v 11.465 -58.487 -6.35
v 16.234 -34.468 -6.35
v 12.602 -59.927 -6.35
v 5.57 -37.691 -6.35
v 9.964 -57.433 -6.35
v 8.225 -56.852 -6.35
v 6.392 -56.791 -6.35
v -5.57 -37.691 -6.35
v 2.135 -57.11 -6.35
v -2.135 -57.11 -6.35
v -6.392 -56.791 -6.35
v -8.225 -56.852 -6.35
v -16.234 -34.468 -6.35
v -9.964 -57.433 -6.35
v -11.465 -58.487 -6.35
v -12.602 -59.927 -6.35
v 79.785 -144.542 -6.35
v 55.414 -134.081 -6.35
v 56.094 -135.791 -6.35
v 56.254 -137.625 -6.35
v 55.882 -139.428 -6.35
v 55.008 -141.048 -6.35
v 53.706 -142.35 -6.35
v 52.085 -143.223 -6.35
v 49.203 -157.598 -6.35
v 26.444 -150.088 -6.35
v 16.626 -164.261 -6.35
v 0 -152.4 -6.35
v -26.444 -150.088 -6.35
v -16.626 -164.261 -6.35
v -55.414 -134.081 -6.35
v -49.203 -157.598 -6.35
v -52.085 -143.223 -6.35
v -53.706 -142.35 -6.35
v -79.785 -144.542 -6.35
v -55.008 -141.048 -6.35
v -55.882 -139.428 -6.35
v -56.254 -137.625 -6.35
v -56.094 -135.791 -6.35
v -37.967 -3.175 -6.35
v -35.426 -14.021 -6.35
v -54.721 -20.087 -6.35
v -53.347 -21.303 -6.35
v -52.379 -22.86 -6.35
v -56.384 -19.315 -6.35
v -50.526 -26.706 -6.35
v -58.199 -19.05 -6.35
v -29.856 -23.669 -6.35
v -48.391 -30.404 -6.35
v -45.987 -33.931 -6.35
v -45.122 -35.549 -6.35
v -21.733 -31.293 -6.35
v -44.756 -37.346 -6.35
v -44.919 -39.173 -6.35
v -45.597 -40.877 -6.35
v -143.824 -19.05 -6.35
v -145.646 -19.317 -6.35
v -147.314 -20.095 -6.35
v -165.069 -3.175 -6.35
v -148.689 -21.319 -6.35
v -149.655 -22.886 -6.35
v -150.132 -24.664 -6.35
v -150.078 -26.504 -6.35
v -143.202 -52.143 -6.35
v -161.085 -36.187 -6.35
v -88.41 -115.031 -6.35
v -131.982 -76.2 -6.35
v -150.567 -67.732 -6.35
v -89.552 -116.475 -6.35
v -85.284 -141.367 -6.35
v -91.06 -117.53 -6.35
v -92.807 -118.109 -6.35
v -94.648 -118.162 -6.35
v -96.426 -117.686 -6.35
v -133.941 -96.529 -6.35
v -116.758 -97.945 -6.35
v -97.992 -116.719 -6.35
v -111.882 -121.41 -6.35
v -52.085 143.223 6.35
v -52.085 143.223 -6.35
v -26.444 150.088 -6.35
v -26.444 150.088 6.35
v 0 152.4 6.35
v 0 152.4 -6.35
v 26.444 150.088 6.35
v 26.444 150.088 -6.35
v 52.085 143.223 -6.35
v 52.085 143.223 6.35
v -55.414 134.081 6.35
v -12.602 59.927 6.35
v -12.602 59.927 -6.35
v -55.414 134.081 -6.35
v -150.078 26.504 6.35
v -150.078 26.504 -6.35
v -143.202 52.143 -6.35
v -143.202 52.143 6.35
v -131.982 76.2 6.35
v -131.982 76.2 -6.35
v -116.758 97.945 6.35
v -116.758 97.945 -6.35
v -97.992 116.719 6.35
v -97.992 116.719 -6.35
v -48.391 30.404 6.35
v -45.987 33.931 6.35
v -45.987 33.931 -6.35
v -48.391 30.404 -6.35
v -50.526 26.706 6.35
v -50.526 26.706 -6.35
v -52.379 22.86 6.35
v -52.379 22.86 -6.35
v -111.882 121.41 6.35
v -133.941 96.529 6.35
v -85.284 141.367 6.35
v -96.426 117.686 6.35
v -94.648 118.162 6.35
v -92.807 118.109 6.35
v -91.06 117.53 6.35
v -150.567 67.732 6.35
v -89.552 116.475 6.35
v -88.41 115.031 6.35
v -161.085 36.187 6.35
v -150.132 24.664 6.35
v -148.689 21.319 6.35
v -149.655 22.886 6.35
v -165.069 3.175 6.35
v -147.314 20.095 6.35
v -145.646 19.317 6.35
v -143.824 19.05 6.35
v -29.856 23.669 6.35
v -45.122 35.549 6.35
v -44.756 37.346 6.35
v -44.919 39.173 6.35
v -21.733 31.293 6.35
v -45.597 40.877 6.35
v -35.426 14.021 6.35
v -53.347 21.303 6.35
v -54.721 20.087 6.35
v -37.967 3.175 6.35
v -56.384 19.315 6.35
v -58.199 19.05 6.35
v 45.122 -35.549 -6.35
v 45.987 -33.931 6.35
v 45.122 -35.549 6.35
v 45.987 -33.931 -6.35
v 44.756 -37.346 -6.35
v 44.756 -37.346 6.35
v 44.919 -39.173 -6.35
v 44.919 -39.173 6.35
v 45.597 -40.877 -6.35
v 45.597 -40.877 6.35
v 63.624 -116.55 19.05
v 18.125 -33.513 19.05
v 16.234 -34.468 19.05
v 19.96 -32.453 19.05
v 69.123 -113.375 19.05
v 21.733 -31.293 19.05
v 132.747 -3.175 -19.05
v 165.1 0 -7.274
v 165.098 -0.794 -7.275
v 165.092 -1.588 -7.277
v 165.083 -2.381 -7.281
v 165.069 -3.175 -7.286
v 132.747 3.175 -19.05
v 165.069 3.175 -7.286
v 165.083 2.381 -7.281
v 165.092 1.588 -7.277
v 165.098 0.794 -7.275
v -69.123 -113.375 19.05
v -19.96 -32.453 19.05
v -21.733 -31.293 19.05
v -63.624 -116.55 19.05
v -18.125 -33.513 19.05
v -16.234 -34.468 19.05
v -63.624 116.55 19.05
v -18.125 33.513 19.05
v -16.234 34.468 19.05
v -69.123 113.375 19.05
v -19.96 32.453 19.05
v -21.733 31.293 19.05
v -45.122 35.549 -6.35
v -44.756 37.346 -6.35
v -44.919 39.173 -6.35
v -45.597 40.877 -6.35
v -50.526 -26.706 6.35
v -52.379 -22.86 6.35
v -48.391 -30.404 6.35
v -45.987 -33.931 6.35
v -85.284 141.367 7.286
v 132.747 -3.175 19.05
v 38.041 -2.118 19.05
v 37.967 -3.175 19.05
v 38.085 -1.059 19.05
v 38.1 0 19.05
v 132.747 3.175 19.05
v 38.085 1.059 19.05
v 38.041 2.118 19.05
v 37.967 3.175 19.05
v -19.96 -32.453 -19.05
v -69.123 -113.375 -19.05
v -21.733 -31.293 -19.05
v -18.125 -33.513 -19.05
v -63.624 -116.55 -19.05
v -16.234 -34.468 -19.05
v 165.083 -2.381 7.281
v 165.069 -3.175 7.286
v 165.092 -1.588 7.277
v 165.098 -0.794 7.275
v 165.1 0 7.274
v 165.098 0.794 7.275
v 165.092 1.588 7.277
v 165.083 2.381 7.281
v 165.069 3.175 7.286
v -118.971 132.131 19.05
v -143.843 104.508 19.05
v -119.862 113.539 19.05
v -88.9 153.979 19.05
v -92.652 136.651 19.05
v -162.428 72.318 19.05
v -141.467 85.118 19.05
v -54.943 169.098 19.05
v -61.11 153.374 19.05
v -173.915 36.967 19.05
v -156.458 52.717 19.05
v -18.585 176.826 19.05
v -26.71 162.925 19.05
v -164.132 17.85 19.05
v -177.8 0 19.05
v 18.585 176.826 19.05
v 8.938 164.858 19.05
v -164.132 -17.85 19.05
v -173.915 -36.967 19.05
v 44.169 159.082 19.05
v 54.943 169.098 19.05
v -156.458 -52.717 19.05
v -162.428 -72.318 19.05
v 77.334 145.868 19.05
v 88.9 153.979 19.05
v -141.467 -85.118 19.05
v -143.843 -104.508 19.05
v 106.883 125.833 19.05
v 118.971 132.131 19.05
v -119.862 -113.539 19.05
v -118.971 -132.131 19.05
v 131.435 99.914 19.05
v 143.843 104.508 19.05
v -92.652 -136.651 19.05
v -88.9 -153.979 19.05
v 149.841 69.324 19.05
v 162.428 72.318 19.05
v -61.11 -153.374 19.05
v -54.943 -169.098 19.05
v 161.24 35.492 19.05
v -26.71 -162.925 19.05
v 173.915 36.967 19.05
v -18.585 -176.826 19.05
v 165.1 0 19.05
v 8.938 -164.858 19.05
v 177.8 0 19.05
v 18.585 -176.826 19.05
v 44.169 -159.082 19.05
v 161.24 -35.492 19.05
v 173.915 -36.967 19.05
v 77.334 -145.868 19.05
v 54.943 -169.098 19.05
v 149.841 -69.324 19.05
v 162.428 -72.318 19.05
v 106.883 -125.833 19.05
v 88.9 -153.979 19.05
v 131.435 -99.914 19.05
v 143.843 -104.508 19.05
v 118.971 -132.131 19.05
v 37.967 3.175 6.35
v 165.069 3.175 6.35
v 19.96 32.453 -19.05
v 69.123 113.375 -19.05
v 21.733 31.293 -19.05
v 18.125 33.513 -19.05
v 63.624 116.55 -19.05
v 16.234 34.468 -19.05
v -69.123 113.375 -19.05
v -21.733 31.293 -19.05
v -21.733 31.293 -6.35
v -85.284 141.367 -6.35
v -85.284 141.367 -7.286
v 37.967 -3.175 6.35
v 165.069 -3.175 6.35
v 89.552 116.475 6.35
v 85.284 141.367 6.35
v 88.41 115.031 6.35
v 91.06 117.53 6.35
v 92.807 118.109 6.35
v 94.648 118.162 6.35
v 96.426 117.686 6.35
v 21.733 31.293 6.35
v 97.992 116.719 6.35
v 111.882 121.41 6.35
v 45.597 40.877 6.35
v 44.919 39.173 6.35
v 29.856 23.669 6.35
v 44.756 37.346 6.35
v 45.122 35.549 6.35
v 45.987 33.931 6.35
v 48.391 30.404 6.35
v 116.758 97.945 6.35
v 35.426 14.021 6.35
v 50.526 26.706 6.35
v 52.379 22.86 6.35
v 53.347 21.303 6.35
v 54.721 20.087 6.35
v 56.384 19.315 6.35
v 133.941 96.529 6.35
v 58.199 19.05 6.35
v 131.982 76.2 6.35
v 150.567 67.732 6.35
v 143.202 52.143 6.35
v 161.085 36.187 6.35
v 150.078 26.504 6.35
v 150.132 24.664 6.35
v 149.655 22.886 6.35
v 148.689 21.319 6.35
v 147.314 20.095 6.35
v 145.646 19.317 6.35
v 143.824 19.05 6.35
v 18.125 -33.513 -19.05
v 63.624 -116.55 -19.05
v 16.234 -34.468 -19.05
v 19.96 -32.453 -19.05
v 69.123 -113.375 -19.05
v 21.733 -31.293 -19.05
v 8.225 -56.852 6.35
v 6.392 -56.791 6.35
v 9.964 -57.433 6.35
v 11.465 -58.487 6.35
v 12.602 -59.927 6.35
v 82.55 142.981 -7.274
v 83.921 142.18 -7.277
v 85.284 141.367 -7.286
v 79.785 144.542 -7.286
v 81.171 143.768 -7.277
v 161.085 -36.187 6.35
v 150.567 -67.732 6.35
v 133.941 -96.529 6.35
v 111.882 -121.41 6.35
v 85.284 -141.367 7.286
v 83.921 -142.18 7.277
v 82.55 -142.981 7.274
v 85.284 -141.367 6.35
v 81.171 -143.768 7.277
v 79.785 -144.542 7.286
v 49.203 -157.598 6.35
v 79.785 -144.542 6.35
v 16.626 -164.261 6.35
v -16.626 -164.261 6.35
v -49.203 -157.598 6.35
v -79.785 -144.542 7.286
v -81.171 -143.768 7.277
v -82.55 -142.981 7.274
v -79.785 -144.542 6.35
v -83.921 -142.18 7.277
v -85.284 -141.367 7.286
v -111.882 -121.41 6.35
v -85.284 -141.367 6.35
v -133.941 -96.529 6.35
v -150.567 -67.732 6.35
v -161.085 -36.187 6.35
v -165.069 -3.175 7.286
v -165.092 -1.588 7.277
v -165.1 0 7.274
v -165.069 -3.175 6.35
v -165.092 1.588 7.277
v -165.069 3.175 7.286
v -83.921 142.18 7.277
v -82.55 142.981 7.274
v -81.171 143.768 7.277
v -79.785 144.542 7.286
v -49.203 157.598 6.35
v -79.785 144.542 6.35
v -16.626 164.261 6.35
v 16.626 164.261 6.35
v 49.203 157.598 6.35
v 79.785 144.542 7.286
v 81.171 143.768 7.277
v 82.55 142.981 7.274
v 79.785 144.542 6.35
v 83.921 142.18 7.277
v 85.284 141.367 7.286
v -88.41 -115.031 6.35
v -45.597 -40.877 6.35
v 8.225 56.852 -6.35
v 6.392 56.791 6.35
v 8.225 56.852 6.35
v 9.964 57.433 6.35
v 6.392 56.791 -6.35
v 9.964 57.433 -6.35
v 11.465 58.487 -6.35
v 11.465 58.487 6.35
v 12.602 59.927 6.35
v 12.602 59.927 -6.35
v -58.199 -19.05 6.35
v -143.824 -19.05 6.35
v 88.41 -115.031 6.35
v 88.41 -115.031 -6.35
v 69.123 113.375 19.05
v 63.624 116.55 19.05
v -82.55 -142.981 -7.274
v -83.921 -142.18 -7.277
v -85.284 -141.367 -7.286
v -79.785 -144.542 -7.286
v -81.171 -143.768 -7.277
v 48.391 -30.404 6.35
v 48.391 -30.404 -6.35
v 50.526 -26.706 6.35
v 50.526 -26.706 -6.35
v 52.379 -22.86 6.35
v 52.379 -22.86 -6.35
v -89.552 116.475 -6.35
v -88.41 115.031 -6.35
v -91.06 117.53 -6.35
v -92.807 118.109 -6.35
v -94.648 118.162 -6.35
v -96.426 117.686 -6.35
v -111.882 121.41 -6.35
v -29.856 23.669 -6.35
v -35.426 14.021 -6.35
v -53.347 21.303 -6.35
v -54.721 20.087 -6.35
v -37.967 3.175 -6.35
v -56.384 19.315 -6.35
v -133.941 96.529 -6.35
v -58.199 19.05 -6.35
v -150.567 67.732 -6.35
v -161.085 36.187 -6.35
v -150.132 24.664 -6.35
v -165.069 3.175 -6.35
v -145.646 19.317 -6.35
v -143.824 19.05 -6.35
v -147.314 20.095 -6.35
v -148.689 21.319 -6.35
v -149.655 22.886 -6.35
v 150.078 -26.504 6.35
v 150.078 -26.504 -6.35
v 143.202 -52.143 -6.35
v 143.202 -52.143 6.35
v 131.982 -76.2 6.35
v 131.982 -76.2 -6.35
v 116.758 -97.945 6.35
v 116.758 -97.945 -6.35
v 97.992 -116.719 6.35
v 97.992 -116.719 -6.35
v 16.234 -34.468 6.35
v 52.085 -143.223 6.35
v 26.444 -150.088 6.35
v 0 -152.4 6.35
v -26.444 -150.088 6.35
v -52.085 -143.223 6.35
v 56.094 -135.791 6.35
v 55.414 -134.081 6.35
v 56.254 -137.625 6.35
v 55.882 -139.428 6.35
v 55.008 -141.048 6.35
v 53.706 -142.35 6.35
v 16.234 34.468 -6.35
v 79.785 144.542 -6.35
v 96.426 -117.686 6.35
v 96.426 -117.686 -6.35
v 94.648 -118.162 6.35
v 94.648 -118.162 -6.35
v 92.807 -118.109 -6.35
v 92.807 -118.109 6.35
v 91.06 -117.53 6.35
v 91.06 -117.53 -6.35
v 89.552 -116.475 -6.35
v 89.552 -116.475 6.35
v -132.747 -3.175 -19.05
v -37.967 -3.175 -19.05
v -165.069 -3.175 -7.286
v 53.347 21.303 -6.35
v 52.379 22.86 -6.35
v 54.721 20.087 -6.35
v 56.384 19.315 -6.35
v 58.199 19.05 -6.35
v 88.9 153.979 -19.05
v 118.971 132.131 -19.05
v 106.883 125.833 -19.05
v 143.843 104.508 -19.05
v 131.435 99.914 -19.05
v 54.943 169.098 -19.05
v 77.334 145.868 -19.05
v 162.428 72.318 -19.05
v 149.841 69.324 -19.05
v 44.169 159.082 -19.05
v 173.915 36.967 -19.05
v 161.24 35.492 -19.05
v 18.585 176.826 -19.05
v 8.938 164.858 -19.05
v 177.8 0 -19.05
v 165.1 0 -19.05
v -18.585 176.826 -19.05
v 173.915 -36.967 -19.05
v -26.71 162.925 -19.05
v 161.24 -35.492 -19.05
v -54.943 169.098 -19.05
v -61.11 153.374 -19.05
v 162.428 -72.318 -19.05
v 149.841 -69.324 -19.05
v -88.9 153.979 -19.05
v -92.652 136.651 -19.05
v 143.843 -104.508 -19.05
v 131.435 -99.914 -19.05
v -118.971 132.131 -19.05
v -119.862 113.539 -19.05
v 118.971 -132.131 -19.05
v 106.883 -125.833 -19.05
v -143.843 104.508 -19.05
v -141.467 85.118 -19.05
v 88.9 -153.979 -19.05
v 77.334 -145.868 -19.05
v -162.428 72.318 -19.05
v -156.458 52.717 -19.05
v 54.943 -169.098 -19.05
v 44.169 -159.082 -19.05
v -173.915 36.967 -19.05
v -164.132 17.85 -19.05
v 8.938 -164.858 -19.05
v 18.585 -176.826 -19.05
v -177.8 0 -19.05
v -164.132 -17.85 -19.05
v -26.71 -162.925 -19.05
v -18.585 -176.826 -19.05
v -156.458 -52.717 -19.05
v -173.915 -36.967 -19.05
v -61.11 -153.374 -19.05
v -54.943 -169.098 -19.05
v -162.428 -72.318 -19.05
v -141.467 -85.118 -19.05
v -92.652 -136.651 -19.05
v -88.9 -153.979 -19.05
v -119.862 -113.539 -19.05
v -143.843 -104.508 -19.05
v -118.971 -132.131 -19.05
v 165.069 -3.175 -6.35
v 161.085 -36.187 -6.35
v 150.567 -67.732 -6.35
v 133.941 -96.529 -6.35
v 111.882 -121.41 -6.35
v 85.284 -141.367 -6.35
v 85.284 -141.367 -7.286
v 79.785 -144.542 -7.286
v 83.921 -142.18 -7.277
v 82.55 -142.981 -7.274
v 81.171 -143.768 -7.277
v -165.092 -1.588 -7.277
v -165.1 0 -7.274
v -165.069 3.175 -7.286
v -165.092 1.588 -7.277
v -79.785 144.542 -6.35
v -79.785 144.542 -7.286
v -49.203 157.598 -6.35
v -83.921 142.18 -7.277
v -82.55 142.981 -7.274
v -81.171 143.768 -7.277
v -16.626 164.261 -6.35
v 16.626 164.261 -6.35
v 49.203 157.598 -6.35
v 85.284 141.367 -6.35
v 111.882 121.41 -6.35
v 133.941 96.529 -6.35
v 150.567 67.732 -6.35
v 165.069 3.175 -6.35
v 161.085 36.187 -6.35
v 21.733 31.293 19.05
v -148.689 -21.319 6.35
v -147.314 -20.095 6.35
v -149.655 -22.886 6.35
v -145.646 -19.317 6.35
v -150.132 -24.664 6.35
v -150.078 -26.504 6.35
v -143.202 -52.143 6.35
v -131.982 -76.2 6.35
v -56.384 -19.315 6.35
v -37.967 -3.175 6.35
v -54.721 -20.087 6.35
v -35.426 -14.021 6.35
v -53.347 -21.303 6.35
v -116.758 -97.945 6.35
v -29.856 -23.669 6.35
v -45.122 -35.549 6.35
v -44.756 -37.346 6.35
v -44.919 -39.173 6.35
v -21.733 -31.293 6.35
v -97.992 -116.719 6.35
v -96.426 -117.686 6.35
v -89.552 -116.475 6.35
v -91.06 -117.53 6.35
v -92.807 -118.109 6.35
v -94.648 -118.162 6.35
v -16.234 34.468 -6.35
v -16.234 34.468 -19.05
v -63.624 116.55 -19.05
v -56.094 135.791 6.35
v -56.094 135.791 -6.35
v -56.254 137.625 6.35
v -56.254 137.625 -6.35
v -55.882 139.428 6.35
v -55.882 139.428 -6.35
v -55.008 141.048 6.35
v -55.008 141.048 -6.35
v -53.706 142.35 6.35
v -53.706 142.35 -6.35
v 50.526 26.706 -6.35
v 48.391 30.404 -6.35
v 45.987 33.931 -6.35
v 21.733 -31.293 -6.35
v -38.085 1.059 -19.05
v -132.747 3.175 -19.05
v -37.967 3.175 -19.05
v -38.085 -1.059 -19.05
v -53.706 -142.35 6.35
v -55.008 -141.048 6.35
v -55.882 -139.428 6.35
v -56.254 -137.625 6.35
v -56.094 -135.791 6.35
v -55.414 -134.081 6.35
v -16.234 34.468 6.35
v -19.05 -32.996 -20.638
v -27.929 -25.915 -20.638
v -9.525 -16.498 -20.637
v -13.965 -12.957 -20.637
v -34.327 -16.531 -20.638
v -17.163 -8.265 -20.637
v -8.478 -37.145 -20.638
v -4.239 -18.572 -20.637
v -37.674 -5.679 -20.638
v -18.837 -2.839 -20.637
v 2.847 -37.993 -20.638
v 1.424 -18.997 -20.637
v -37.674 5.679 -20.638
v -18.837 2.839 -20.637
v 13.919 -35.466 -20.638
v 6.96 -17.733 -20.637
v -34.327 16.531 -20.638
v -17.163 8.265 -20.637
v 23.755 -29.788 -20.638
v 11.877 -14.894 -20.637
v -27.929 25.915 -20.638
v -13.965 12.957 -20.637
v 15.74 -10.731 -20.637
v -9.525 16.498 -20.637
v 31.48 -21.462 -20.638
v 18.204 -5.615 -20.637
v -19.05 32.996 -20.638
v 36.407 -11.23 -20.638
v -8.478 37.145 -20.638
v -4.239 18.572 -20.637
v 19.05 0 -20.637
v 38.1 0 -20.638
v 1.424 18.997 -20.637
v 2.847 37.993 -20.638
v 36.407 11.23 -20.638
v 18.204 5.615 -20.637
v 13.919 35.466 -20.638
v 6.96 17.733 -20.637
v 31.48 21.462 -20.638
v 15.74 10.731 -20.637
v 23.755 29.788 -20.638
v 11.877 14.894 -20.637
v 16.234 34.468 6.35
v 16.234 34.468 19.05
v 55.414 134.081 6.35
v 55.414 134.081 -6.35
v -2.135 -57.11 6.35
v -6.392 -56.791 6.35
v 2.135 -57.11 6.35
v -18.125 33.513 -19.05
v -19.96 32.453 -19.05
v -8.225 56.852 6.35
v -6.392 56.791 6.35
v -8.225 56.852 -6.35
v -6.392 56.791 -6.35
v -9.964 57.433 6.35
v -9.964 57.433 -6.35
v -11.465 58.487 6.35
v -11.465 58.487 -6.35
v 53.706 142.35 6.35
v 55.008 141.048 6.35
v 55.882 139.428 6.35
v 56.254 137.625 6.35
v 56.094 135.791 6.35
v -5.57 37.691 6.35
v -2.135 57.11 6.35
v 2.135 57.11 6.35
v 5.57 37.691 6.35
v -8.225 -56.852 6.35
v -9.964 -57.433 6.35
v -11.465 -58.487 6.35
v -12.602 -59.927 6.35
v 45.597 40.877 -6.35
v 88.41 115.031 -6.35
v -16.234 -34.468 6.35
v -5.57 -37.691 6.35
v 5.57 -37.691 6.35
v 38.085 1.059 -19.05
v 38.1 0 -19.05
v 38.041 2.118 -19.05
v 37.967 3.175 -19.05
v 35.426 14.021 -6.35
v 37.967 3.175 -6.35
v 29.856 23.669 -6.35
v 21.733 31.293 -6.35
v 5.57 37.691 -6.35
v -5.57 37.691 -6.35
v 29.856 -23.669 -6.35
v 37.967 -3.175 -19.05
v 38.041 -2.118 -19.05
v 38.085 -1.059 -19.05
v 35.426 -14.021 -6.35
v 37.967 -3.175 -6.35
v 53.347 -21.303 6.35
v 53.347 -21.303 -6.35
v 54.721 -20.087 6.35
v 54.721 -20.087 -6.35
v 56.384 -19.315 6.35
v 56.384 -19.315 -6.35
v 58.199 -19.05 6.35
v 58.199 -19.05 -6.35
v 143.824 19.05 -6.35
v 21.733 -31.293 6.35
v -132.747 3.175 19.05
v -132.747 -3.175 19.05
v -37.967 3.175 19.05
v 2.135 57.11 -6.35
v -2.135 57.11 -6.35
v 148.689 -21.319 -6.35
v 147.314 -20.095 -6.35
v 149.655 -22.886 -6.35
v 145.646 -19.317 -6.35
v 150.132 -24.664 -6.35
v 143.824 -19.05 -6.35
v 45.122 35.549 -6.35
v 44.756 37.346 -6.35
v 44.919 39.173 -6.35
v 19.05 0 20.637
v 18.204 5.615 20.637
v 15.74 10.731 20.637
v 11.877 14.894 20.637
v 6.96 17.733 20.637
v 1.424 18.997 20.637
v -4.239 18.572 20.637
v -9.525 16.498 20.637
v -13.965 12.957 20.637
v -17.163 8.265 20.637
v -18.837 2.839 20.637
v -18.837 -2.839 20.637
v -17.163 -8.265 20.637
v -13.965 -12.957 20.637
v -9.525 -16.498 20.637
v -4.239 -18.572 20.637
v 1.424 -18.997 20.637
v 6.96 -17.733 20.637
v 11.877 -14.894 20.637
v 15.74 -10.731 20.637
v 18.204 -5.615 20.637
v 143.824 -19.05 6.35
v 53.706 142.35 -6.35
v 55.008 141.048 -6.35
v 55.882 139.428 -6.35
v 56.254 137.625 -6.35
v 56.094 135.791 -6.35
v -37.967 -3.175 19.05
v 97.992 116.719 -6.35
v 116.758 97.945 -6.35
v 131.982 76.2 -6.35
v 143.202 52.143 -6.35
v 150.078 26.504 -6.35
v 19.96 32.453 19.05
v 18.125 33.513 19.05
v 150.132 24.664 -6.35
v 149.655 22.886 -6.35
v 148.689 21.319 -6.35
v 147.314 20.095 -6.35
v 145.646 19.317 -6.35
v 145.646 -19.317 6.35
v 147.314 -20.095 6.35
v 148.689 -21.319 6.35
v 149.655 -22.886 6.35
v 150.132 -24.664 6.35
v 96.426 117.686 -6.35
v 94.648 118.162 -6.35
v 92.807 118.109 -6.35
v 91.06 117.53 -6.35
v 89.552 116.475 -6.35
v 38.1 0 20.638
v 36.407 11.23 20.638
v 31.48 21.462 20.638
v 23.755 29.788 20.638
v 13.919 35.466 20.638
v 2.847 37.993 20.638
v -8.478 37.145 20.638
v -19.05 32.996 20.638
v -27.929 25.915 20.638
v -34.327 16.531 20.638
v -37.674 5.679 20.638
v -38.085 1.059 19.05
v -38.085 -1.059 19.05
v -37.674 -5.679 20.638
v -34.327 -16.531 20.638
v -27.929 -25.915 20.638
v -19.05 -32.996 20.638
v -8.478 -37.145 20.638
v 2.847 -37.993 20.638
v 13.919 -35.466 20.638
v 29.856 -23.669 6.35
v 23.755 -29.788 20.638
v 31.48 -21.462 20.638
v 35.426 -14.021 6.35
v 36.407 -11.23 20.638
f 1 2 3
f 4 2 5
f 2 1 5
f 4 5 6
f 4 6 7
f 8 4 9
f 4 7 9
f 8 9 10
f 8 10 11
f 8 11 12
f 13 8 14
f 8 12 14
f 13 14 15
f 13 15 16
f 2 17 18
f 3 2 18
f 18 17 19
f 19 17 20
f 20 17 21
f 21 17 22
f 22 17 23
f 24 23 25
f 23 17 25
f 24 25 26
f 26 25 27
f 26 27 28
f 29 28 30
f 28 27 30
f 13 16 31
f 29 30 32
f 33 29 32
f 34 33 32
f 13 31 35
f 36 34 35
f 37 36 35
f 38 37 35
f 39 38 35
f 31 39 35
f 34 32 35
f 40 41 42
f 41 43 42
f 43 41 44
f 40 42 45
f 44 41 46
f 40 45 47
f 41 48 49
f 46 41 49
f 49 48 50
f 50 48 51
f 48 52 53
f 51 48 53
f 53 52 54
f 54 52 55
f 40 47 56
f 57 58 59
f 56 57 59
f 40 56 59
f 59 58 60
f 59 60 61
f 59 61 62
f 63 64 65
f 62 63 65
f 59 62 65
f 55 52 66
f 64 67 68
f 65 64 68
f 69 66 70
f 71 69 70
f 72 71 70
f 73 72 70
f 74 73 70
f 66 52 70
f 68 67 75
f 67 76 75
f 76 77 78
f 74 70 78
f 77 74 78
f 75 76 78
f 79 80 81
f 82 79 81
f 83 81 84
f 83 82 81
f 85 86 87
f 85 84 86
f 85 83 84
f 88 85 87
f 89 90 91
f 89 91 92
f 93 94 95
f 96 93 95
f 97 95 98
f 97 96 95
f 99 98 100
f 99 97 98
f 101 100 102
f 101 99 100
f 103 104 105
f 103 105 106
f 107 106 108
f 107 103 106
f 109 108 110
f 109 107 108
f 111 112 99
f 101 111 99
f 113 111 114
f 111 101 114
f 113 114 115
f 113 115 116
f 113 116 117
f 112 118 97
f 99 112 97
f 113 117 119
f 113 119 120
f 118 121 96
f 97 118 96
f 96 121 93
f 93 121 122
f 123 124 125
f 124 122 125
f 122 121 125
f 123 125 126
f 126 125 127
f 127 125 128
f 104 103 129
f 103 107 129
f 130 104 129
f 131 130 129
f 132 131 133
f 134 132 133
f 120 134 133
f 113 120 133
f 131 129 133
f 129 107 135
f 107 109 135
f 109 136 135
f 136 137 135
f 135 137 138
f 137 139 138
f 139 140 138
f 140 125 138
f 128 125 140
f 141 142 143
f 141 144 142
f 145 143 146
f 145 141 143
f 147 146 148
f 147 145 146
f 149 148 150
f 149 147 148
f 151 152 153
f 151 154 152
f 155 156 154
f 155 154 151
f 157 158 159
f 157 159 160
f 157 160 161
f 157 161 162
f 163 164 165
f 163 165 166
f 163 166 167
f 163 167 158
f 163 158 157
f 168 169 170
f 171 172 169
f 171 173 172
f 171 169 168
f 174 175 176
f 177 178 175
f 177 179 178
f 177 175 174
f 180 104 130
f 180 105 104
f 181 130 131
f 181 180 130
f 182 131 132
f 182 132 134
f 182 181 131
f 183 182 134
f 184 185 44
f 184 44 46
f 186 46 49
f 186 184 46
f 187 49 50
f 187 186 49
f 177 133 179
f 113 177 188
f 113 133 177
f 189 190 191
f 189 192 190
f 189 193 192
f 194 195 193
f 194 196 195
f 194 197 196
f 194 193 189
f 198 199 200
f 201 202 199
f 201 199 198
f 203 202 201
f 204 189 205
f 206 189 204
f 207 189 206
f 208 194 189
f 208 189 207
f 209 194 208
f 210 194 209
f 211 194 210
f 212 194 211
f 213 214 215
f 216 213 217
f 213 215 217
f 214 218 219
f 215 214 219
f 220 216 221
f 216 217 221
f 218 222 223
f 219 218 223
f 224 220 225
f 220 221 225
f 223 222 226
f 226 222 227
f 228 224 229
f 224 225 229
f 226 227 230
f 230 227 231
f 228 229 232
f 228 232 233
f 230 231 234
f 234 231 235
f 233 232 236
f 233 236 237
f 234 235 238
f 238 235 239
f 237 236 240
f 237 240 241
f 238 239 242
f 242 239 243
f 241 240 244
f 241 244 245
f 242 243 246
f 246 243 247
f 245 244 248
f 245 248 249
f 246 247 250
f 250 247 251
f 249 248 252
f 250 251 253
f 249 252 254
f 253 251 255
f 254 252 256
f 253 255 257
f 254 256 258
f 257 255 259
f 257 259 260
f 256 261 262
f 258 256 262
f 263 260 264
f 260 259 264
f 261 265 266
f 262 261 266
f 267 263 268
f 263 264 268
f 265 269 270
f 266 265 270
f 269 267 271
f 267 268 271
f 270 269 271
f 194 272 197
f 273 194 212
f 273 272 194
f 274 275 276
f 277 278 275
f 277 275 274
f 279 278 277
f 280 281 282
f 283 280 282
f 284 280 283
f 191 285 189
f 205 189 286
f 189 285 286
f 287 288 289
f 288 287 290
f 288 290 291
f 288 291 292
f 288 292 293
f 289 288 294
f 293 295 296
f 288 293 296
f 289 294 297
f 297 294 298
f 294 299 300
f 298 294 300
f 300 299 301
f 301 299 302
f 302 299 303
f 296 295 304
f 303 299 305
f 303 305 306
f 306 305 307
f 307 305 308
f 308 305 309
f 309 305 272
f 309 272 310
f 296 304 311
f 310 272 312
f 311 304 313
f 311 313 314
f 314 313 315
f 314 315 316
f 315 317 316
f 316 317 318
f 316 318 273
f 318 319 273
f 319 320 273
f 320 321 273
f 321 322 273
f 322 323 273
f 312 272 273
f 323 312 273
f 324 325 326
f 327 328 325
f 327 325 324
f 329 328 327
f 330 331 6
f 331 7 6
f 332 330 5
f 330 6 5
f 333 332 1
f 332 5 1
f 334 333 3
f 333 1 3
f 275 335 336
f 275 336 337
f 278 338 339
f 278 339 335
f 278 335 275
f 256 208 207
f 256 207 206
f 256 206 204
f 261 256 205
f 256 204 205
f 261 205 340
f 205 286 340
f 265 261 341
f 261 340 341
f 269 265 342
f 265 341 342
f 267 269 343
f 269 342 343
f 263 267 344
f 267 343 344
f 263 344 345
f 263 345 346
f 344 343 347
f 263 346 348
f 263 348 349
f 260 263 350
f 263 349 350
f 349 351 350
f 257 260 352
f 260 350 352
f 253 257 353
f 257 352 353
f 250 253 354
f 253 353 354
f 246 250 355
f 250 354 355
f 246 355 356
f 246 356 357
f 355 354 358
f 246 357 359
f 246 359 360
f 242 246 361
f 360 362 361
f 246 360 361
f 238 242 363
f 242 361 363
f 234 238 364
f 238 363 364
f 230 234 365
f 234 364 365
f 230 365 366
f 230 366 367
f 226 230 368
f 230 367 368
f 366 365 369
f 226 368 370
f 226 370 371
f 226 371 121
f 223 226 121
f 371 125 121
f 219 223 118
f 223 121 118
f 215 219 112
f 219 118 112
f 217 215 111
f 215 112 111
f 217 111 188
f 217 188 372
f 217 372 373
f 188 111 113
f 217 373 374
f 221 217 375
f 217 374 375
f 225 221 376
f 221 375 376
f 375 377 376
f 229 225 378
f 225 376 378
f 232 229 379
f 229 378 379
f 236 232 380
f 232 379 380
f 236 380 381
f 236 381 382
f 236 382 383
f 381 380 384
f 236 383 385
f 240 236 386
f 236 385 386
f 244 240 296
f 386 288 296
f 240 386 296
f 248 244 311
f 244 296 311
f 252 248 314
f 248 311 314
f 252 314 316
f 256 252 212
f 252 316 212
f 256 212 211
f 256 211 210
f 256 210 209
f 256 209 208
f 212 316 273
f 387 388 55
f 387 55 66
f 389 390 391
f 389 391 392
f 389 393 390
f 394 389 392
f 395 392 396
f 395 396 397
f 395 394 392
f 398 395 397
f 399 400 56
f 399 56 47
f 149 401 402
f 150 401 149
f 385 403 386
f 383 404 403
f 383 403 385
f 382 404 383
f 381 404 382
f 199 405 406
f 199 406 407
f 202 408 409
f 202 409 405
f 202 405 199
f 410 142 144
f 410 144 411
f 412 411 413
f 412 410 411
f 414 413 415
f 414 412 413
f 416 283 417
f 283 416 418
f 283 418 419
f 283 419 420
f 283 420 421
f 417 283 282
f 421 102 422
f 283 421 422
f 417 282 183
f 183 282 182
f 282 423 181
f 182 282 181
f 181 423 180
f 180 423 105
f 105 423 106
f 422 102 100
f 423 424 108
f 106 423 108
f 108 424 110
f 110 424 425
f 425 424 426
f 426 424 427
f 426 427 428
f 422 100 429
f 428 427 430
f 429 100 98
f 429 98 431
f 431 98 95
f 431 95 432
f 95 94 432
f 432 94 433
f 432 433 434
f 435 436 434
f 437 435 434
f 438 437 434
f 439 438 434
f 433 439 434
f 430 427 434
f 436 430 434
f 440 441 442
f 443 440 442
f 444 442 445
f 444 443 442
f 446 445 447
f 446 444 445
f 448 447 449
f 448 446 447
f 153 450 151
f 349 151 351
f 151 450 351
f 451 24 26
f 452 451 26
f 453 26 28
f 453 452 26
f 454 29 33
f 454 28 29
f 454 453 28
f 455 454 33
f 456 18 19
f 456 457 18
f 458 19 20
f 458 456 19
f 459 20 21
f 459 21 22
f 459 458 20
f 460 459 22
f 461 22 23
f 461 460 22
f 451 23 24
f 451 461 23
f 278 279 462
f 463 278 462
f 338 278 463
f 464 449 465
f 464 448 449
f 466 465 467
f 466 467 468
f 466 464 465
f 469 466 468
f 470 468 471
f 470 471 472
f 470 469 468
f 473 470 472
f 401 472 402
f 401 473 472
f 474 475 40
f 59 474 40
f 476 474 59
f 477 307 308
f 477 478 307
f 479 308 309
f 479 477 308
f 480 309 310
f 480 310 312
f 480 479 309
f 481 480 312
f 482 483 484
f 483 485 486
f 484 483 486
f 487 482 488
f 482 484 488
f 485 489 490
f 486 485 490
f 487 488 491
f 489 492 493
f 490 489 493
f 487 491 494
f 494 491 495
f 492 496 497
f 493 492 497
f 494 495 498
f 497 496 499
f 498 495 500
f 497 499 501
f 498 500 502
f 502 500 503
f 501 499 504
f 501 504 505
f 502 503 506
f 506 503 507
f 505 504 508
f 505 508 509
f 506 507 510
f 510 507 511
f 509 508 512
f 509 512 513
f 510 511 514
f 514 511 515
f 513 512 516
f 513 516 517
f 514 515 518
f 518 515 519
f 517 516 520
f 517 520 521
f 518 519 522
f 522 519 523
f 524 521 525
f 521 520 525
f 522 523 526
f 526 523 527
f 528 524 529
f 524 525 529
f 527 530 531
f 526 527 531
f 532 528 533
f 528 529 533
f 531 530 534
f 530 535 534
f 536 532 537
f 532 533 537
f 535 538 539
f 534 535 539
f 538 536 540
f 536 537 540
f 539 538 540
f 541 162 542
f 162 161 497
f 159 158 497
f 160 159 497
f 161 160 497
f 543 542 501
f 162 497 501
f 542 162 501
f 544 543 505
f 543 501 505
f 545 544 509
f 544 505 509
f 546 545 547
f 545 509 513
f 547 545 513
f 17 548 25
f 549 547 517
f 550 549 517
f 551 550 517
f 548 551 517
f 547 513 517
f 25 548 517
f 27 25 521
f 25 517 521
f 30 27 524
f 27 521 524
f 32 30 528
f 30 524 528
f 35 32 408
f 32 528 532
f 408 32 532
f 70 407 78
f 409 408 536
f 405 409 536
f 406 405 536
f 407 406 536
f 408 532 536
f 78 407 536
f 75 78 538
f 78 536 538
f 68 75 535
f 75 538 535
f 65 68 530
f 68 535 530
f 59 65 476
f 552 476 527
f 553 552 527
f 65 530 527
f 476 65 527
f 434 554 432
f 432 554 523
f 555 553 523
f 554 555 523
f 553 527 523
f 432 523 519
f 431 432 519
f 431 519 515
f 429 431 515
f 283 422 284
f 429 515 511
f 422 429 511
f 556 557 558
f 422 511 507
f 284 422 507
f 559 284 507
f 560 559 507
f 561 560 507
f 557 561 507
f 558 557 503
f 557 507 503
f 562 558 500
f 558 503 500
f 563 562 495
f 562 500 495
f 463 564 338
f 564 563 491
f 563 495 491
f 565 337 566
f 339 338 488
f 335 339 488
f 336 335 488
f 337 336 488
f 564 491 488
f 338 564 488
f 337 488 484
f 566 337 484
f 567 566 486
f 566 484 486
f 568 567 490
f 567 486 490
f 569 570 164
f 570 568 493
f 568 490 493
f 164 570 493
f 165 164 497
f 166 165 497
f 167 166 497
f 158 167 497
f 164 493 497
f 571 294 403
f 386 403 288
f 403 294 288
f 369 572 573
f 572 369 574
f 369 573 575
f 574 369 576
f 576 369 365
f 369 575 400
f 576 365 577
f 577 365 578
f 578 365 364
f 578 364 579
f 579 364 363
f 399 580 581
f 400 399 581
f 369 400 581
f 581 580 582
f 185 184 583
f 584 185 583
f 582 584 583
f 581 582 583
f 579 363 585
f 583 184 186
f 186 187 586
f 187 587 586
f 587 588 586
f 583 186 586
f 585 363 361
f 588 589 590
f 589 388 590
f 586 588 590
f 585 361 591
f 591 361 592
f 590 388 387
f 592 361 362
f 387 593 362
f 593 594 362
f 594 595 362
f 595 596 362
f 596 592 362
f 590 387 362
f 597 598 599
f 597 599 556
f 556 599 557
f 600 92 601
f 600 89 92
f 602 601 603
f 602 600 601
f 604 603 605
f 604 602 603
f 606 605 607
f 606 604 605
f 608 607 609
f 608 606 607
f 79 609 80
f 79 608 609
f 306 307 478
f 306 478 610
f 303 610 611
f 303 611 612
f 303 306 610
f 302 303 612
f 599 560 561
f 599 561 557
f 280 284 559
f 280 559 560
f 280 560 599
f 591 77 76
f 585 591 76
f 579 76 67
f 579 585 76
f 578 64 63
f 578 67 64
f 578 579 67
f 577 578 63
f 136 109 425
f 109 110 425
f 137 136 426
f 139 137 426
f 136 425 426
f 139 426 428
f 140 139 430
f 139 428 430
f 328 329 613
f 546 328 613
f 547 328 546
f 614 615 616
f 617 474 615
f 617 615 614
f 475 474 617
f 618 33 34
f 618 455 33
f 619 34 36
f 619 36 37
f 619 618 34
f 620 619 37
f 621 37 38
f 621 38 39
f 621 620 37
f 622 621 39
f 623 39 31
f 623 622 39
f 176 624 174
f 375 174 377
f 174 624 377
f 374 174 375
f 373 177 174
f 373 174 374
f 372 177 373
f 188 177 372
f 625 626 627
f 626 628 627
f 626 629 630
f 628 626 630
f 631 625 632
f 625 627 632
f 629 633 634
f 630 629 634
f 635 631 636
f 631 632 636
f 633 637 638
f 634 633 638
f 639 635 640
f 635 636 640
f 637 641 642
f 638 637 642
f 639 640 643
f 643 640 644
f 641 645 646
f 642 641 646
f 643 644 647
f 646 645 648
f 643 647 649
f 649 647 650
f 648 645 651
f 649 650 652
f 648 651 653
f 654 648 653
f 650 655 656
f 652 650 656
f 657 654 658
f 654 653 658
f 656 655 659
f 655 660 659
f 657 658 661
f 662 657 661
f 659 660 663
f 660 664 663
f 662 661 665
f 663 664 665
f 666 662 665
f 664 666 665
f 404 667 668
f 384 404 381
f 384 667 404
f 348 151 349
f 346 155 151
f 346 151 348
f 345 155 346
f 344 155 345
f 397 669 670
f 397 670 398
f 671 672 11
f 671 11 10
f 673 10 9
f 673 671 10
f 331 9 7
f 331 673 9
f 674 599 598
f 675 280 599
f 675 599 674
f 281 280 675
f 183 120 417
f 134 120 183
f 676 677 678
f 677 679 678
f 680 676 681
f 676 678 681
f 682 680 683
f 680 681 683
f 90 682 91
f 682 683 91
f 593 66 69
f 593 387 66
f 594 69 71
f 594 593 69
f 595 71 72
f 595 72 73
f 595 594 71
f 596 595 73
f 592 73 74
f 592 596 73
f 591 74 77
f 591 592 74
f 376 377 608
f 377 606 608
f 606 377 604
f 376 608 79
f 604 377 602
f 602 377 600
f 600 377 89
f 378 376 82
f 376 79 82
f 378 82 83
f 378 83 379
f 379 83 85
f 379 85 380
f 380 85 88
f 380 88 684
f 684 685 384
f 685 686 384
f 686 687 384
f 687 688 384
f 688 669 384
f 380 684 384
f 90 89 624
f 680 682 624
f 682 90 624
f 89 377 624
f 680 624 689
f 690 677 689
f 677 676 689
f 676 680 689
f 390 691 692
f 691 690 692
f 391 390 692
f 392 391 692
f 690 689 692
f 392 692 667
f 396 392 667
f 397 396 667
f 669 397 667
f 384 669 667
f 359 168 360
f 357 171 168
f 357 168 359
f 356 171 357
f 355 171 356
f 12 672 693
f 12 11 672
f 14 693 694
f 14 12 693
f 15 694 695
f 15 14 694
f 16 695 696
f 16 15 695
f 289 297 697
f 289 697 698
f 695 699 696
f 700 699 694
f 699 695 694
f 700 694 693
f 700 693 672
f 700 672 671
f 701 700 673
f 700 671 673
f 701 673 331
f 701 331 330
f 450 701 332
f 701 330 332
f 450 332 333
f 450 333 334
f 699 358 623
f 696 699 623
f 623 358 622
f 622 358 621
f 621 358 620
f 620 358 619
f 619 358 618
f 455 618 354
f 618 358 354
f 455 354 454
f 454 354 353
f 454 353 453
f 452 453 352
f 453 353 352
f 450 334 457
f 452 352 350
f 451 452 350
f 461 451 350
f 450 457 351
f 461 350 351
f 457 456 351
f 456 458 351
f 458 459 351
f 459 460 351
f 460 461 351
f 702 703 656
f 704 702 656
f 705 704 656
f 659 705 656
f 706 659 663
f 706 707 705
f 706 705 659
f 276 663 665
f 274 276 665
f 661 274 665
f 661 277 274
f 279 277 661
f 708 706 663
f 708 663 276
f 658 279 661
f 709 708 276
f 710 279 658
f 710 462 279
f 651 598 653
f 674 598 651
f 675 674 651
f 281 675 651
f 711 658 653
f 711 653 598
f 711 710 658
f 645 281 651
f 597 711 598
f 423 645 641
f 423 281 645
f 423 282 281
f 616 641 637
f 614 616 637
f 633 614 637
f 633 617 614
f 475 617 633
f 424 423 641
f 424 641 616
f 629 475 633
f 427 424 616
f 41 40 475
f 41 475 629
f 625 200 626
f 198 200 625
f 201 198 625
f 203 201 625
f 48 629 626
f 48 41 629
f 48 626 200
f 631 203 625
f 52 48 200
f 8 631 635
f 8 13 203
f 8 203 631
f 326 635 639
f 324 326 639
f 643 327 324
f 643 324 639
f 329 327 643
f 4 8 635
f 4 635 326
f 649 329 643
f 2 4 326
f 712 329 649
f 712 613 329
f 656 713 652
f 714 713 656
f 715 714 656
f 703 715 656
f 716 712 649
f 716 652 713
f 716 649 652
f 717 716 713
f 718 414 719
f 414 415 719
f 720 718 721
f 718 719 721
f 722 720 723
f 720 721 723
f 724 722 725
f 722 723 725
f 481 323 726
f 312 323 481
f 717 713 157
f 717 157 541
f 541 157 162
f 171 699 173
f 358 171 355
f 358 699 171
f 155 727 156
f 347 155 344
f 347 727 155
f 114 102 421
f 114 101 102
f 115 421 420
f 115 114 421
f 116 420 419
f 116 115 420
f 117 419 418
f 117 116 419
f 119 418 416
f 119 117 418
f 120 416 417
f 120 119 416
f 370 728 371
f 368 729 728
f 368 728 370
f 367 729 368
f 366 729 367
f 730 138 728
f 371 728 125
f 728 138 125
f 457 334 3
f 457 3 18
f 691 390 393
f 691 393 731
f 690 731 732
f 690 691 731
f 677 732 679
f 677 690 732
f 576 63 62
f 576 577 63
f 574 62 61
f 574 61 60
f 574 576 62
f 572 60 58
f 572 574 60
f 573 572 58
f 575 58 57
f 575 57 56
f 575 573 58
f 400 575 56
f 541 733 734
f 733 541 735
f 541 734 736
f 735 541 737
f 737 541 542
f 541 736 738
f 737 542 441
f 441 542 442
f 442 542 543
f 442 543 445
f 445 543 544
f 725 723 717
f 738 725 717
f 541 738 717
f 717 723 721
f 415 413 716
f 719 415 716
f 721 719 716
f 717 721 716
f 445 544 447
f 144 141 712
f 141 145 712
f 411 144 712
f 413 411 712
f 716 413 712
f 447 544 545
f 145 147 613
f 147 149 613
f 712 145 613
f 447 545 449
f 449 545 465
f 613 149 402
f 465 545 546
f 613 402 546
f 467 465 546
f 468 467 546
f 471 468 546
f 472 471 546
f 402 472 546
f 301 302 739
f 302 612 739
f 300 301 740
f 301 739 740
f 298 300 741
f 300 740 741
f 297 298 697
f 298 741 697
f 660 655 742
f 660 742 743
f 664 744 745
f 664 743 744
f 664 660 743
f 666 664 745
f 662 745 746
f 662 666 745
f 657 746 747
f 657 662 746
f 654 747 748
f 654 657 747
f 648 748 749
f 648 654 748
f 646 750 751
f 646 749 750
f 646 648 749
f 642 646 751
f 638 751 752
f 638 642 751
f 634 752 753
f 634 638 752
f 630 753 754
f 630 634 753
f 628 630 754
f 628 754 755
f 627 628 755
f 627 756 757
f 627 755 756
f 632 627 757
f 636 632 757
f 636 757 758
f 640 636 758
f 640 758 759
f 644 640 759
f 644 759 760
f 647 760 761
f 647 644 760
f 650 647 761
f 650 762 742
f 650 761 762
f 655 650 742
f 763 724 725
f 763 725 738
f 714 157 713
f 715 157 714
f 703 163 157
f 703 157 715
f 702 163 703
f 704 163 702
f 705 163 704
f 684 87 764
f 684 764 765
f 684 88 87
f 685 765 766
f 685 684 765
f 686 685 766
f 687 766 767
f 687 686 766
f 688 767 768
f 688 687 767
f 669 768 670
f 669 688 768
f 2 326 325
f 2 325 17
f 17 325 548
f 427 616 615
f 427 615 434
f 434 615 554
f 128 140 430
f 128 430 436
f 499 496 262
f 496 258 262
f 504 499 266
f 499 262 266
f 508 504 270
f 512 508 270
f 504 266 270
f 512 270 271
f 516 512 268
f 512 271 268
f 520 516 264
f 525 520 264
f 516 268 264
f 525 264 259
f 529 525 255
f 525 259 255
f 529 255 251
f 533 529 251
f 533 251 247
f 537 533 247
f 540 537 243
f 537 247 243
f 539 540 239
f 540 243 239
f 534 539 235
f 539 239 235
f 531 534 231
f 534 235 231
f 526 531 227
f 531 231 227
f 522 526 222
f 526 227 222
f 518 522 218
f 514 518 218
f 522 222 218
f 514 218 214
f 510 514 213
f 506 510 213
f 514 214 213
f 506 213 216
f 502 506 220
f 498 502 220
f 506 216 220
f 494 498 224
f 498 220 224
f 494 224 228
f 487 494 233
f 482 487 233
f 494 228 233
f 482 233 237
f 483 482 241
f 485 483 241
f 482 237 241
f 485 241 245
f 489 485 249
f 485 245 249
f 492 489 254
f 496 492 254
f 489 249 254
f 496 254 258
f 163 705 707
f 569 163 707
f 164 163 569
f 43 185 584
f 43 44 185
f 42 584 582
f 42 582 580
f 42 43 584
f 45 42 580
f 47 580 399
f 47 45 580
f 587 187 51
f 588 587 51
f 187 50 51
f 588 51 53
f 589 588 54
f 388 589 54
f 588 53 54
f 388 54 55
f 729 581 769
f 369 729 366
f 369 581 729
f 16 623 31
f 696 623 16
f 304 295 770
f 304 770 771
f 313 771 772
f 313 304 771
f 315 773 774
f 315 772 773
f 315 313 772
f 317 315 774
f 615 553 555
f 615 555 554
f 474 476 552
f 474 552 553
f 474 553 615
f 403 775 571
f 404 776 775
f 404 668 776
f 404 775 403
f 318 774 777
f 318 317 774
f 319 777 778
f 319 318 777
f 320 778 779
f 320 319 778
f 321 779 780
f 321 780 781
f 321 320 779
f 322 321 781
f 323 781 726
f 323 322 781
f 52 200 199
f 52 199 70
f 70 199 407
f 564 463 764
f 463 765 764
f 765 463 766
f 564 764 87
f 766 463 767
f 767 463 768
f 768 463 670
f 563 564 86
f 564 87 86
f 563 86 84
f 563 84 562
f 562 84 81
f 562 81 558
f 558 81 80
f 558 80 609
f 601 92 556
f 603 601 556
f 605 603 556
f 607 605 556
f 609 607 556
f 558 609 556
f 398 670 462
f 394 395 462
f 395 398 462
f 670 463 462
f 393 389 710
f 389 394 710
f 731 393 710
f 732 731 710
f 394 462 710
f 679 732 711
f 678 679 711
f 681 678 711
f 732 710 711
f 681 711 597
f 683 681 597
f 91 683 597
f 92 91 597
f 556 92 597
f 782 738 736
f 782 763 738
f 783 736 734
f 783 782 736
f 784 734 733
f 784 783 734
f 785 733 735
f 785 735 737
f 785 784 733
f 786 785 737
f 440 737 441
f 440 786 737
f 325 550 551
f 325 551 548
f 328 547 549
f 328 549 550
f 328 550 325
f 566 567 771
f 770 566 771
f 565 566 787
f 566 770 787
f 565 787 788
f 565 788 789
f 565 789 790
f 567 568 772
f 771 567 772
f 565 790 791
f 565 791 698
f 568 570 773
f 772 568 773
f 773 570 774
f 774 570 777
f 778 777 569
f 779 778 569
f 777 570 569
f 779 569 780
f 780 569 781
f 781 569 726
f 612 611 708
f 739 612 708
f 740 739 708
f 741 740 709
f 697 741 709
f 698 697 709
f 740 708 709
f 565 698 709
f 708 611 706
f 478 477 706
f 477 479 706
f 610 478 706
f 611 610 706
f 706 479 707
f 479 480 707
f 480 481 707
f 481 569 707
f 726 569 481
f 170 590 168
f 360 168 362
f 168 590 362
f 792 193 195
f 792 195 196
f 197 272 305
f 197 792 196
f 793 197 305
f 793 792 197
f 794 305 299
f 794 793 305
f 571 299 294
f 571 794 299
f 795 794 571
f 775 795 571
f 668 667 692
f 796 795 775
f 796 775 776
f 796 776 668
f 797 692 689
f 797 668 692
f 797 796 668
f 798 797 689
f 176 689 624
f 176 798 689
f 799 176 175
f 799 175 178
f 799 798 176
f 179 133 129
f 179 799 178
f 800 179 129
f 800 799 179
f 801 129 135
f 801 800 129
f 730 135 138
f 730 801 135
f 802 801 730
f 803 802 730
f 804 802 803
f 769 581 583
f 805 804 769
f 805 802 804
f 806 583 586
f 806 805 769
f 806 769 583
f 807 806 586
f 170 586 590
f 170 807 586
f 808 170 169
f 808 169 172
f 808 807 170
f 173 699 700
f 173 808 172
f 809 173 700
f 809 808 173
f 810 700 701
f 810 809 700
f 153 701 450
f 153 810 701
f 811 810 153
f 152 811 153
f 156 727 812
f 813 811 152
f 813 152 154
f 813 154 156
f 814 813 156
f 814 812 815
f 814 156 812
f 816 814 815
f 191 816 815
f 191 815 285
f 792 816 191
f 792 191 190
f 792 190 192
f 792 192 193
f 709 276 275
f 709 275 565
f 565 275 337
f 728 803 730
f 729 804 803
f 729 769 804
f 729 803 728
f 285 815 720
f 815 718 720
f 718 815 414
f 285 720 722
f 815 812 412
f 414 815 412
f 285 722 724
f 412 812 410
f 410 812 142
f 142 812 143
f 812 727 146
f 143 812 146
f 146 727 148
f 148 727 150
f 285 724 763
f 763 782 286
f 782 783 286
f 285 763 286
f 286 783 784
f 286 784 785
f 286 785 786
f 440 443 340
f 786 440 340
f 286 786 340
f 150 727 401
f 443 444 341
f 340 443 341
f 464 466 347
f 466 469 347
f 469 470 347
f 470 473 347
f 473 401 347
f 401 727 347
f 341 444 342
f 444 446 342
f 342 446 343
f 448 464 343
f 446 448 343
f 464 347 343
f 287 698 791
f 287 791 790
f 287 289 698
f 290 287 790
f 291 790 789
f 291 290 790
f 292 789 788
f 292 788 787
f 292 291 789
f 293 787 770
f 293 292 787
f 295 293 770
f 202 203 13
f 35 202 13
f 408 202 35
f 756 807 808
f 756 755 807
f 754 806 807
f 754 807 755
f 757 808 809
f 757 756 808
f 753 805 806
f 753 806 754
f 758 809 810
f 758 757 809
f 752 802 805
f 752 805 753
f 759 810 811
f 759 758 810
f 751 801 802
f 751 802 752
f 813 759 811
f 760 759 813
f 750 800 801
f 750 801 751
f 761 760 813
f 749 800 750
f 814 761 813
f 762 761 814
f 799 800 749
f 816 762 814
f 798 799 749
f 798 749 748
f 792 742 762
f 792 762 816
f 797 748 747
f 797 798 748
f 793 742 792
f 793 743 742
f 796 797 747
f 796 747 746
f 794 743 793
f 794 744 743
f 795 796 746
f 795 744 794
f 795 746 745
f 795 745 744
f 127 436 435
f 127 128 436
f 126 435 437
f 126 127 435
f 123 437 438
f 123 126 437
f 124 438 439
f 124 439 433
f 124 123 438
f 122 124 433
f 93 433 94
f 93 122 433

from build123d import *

# Parameters (mm, degrees)
SKETCH1_R                = 38.1
CENTERHUB_DEPTH          = 20.6375
RIB_DEPTH                = 3.175
LIGHTENING_HOLE_DEPTH    = 253.292660231
FILLET1_R                = 6.35
CIRPATTERN1_COUNT        = 6
FILLET1_OF_CIRPATTERN1_R = 6.35
THRU_HOLE_DEPTH          = 253.292660231
THRU_HOLE_DEPTH_BACK     = 253.292660231
SKETCH5_R                = 19.05


with BuildPart() as part:
    # Sketch1 → CenterHub (new, symmetric)
    with BuildSketch(Plane.XY):
        Circle(SKETCH1_R)
    extrude(amount=CENTERHUB_DEPTH, both=True)

    # Sketch2 → Rim and Web (revolve)
    with BuildSketch(Plane(origin=(0, 0, 0), x_dir=(0, 0, -1), z_dir=(1, 0, 0)), mode=Mode.PRIVATE) as rim_and_web_sk:
        Polygon((-6.35, 0), (6.35, 0), (6.35, 165.1), (19.05, 165.1), (19.05, 177.8), (-19.05, 177.8), (-19.05, 165.1), (-6.35, 165.1), align=None)
    revolve(rim_and_web_sk.sketch.rotate(Axis((0, 0, 0), (0, 0, -1)), 90), axis=Axis((0, 0, 0), (0, 0, -1)))

    # Sketch3 → Rib (add, symmetric)
    with BuildSketch(Plane(origin=(0, 0, 0), x_dir=(1, 0, 0), z_dir=(0, 1, 0))):
        Polygon((0, -19.05), (132.747036773, -19.05), (167.64, -6.35), (167.64, 6.35), (132.747036773, 19.05), (0, 19.05), align=None)
    rib = extrude(amount=RIB_DEPTH, both=True)

    # Sketch4 → Lightening hole (cut, symmetric)
    with BuildSketch(Plane.XY):
        with BuildLine():
            Line((92.100127656, -121.422100483), (43.438552305, -37.1377796))
            ThreePointArc((43.438552305, -37.1377796), (49.493351826, -28.575), (53.881536726, -19.05))
            Line((53.881536726, -19.05), (151.204687427, -19.05))
            ThreePointArc((151.204687427, -19.05), (131.982271537, -76.2), (92.100127656, -121.422100483))
        make_face()
    lightening_hole = extrude(amount=LIGHTENING_HOLE_DEPTH, both=True, mode=Mode.SUBTRACT)

    # Fillet1
    fillet1_edges = [part.edges().sort_by_distance(p)[0] for p in [
        (151.204687427, -19.05, 0),
        (92.100127656, -121.422100483, 0),
        (43.438552305, -37.1377796, 0),
        (53.881536726, -19.05, 0),
    ]]
    fillet(fillet1_edges, radius=FILLET1_R)

    # CirPattern1: Rib, Lightening hole ×6 about axis
    cirpattern1_axis = Axis((0, 0, 0), (0, 0, 1))
    add([rib.rotate(cirpattern1_axis, i * 360 / CIRPATTERN1_COUNT) for i in range(1, CIRPATTERN1_COUNT)])
    add([lightening_hole.rotate(cirpattern1_axis, i * 360 / CIRPATTERN1_COUNT) for i in range(1, CIRPATTERN1_COUNT)], mode=Mode.SUBTRACT)

    # Fillet1 of CirPattern1
    fillet1_of_cirpattern1_edges = [part.edges().sort_by_distance(p)[0] for p in [
        (92.100127656, 121.422100483, 0),
        (151.204687427, 19.05, 0),
        (53.881536726, 19.05, 0),
        (43.438552305, 37.1377796, 0),
        (-59.104559772, 140.472100483, 0),
        (59.104559772, 140.472100483, 0),
        (10.442984421, 56.1877796, 0),
        (-10.442984421, 56.1877796, 0),
        (-151.204687427, 19.05, 0),
        (-92.100127656, 121.422100483, 0),
        (-43.438552305, 37.1377796, 0),
        (-53.881536726, 19.05, 0),
        (-92.100127656, -121.422100483, 0),
        (-151.204687427, -19.05, 0),
        (-53.881536726, -19.05, 0),
        (-43.438552305, -37.1377796, 0),
        (59.104559772, -140.472100483, 0),
        (-59.104559772, -140.472100483, 0),
        (-10.442984421, -56.1877796, 0),
        (10.442984421, -56.1877796, 0),
    ]]
    fillet(fillet1_of_cirpattern1_edges, radius=FILLET1_OF_CIRPATTERN1_R)

    # Sketch5 → Thru hole (cut, two sides: drawn at the far end of the back side and taken through both)
    with BuildSketch(Plane.XY.offset(-THRU_HOLE_DEPTH_BACK)):
        Circle(SKETCH5_R)
    extrude(amount=THRU_HOLE_DEPTH + THRU_HOLE_DEPTH_BACK, mode=Mode.SUBTRACT)


solid = part.part
